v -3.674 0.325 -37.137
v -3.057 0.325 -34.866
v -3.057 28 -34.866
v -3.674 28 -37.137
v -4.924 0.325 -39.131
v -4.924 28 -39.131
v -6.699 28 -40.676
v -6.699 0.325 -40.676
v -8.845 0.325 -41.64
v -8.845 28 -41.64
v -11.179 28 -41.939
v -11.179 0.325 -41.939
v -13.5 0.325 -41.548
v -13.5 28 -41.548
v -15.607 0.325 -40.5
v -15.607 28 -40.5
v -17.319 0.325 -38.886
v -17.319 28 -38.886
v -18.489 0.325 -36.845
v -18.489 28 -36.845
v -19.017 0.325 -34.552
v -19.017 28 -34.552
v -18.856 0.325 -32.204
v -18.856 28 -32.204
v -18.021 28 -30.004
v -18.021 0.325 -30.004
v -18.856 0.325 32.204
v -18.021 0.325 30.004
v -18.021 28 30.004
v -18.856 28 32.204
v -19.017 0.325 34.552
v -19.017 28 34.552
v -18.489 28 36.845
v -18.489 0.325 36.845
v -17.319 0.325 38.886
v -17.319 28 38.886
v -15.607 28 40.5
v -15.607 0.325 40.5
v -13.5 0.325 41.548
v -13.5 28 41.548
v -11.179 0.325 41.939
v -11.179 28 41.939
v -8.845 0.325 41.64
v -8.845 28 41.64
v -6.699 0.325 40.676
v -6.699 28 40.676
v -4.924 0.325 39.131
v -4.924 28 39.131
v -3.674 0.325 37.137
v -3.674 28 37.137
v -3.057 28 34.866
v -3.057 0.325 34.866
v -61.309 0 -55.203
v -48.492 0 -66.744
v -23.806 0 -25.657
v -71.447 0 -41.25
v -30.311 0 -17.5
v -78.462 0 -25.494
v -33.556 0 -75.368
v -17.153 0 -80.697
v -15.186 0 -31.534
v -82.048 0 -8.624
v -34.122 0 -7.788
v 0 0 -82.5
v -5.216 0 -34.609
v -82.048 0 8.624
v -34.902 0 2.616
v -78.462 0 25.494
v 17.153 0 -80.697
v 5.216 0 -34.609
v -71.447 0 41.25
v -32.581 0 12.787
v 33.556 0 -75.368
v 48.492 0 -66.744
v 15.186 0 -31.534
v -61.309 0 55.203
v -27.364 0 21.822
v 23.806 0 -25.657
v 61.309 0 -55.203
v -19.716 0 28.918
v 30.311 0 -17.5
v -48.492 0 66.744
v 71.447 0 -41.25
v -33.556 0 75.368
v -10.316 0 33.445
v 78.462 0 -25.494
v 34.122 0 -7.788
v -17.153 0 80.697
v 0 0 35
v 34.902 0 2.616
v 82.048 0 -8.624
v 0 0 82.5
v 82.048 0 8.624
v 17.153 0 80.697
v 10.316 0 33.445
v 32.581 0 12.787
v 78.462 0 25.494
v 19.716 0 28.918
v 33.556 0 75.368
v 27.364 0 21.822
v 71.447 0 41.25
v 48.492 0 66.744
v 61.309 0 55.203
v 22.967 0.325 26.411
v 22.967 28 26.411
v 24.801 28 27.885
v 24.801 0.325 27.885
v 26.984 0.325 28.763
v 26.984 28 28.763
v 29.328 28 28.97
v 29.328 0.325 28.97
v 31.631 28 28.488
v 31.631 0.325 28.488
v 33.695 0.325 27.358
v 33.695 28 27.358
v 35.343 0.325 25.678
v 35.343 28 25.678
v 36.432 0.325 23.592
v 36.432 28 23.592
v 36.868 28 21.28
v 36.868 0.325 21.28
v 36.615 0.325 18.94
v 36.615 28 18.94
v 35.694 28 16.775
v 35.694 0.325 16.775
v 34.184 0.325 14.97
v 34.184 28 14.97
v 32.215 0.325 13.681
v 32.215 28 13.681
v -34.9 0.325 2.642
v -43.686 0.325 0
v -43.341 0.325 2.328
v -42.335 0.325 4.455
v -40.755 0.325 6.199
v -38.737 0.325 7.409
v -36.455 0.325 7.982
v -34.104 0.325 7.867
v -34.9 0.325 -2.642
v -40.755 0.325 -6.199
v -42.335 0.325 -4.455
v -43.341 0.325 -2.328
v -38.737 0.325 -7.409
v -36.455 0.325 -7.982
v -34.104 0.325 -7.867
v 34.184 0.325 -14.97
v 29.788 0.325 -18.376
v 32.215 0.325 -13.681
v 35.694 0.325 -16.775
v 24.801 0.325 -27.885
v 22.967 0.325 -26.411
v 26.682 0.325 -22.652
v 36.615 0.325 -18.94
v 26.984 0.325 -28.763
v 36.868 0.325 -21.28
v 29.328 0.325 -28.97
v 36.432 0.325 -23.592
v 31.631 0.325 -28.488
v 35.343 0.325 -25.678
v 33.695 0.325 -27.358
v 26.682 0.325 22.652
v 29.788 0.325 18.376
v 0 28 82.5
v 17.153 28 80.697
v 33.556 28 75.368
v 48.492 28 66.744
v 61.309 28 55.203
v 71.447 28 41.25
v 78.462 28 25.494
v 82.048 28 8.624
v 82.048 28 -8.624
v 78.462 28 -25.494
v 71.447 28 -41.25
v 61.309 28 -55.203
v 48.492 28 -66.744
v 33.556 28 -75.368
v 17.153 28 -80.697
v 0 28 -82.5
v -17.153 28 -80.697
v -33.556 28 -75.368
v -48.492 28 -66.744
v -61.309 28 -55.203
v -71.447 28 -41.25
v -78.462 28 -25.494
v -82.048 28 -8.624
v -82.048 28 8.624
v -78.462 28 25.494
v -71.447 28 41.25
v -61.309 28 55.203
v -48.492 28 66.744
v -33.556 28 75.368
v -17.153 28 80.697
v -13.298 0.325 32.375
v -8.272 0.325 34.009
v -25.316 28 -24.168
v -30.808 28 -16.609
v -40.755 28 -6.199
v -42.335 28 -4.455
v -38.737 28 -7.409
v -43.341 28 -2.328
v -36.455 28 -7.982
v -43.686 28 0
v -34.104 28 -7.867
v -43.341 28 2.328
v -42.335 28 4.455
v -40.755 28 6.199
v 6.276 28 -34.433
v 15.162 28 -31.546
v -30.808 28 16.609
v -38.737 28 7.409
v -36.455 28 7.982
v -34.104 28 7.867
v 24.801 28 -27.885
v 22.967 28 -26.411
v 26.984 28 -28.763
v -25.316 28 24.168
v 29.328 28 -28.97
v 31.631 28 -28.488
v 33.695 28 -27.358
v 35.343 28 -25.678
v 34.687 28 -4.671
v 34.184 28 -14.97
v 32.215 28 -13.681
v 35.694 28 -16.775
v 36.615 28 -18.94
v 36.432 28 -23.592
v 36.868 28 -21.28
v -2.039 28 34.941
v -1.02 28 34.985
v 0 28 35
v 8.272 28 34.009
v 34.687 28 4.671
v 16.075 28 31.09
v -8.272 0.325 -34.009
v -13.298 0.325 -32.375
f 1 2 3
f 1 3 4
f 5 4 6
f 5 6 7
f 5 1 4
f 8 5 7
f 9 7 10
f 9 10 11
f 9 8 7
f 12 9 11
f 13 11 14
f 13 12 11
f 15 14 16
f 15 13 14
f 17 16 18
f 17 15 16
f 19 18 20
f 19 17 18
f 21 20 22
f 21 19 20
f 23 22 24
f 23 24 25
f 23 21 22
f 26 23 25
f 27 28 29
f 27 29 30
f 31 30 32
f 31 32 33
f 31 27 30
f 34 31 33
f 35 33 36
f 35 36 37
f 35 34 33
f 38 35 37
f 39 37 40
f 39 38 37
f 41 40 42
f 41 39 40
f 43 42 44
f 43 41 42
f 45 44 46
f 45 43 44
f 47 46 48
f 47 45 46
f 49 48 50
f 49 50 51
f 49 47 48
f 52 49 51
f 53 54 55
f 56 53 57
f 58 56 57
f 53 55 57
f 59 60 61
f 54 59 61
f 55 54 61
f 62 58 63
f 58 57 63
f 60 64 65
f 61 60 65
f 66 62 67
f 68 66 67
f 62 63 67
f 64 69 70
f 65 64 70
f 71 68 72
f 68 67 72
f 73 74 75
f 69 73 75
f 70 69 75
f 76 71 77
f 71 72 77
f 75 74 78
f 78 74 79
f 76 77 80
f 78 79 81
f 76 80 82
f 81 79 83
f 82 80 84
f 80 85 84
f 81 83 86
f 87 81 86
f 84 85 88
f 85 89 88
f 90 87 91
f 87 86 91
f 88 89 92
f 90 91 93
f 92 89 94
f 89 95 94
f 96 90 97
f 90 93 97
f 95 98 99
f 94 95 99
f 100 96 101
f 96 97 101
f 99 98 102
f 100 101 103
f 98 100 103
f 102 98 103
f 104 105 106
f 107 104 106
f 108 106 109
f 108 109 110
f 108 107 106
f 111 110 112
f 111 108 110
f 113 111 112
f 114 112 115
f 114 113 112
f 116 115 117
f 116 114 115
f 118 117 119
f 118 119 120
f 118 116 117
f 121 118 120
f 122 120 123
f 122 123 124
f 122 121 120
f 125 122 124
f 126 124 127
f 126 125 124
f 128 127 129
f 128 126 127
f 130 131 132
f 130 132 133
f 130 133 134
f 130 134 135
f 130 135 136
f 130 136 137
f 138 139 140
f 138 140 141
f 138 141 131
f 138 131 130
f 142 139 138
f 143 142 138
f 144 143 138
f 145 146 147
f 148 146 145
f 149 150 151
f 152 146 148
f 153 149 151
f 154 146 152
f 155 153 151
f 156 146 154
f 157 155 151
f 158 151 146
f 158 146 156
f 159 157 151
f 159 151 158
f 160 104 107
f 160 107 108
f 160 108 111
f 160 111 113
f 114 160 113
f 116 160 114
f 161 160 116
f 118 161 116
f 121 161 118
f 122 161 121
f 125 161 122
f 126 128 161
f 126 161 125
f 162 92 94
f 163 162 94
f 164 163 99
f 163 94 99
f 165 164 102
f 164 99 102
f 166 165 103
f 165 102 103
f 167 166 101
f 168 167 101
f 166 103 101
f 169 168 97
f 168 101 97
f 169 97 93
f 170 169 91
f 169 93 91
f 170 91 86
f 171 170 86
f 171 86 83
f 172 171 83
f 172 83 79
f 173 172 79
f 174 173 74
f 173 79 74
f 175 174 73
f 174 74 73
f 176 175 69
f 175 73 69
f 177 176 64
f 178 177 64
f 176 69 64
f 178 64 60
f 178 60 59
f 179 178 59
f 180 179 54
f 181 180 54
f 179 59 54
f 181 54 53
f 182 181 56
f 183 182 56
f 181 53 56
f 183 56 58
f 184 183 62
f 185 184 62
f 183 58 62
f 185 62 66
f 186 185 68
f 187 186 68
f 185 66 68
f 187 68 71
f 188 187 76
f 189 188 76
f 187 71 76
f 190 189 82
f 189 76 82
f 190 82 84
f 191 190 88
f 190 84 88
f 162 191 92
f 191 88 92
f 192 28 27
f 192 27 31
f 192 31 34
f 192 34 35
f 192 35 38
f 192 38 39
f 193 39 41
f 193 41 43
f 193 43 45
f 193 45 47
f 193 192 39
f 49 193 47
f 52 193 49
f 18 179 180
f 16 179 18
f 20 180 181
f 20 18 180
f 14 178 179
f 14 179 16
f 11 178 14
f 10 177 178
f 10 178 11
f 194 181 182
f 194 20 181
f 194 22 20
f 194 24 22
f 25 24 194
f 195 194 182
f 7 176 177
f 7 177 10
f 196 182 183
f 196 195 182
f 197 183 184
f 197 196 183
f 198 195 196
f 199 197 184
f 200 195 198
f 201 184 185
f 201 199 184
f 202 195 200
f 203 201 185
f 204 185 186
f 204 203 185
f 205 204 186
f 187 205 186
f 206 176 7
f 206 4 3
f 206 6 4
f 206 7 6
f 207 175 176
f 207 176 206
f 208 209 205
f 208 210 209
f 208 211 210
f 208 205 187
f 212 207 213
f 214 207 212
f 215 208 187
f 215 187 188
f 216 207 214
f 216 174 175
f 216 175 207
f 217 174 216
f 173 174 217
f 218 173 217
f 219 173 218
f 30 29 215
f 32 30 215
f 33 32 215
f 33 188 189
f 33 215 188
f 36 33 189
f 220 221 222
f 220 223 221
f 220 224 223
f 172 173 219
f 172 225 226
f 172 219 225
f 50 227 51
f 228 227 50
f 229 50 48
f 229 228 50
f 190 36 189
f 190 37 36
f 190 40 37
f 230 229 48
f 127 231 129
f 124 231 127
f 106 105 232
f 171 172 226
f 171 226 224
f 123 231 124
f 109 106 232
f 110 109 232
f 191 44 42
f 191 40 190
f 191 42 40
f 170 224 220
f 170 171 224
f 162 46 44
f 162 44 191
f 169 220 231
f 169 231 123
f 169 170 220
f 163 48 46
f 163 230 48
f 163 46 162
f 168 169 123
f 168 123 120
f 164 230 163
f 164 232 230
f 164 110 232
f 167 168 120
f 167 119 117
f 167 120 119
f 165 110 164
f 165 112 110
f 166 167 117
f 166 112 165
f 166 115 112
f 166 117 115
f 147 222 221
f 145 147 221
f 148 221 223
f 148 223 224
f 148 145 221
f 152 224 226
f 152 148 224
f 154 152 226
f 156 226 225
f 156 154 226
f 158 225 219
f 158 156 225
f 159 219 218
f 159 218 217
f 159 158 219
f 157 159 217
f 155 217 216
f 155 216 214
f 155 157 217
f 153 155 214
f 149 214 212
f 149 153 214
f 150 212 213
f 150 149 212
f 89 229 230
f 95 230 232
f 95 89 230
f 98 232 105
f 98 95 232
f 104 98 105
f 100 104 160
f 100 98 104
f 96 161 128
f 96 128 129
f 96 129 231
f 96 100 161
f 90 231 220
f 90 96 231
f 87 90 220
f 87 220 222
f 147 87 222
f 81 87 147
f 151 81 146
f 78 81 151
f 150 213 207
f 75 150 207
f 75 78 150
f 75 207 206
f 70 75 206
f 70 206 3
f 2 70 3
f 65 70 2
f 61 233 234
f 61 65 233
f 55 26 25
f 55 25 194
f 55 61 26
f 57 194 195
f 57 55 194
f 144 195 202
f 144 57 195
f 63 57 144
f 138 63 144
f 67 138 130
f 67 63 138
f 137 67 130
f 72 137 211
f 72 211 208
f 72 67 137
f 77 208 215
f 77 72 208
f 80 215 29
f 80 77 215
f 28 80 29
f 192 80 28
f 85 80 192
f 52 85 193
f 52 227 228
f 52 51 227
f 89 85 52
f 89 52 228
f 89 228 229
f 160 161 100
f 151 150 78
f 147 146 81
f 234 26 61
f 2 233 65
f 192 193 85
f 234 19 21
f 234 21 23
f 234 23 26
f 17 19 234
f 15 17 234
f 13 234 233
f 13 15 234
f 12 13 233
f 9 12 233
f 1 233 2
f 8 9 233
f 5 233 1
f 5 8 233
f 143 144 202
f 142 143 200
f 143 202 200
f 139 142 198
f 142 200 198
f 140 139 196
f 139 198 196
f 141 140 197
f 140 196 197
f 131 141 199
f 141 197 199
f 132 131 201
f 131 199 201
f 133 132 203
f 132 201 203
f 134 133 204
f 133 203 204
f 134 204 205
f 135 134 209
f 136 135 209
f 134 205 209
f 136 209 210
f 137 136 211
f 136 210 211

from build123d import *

# Parameters (mm, degrees)
SKETCH1_R           = 82.5
BOSS_EXTRUDE1_DEPTH = 28
SKETCH2_R           = 35
CUT_EXTRUDE1_DEPTH  = 120.98541578
SKETCH3_R           = 8.020540442
CUT_EXTRUDE2_DEPTH  = 27.674716257
CIRPATTERN1_COUNT   = 5


with BuildPart() as part:
    # Sketch1 → Boss-Extrude1 (new body)
    with BuildSketch(Plane(origin=(0, 0, 0), x_dir=(1, 0, 0), z_dir=(0, 1, 0))):
        Circle(SKETCH1_R)
    extrude(amount=BOSS_EXTRUDE1_DEPTH)

    # Sketch2 → Cut-Extrude1 (cut, through all)
    with BuildSketch(Plane(origin=(0, 0, 0), x_dir=(1, 0, 0), z_dir=(0, 1, 0))):
        Circle(SKETCH2_R)
    extrude(amount=CUT_EXTRUDE1_DEPTH, mode=Mode.SUBTRACT)

    # Sketch3 → Cut-Extrude2 (cut)
    with BuildSketch(Plane(origin=(0, 28, 0), x_dir=(1, 0, 0), z_dir=(0, 1, 0))):
        with Locations((-35.665635629, 0)):
            Circle(SKETCH3_R)
    cut_extrude2 = extrude(amount=-CUT_EXTRUDE2_DEPTH, mode=Mode.SUBTRACT)

    # CirPattern1: Cut-Extrude2 ×5 about axis
    cirpattern1_axis = Axis((0, 0, 0), (0, 1, 0))
    for i in range(1, CIRPATTERN1_COUNT):
        add(cut_extrude2.rotate(cirpattern1_axis, i * 360 / CIRPATTERN1_COUNT), mode=Mode.SUBTRACT)


solid = part.part
